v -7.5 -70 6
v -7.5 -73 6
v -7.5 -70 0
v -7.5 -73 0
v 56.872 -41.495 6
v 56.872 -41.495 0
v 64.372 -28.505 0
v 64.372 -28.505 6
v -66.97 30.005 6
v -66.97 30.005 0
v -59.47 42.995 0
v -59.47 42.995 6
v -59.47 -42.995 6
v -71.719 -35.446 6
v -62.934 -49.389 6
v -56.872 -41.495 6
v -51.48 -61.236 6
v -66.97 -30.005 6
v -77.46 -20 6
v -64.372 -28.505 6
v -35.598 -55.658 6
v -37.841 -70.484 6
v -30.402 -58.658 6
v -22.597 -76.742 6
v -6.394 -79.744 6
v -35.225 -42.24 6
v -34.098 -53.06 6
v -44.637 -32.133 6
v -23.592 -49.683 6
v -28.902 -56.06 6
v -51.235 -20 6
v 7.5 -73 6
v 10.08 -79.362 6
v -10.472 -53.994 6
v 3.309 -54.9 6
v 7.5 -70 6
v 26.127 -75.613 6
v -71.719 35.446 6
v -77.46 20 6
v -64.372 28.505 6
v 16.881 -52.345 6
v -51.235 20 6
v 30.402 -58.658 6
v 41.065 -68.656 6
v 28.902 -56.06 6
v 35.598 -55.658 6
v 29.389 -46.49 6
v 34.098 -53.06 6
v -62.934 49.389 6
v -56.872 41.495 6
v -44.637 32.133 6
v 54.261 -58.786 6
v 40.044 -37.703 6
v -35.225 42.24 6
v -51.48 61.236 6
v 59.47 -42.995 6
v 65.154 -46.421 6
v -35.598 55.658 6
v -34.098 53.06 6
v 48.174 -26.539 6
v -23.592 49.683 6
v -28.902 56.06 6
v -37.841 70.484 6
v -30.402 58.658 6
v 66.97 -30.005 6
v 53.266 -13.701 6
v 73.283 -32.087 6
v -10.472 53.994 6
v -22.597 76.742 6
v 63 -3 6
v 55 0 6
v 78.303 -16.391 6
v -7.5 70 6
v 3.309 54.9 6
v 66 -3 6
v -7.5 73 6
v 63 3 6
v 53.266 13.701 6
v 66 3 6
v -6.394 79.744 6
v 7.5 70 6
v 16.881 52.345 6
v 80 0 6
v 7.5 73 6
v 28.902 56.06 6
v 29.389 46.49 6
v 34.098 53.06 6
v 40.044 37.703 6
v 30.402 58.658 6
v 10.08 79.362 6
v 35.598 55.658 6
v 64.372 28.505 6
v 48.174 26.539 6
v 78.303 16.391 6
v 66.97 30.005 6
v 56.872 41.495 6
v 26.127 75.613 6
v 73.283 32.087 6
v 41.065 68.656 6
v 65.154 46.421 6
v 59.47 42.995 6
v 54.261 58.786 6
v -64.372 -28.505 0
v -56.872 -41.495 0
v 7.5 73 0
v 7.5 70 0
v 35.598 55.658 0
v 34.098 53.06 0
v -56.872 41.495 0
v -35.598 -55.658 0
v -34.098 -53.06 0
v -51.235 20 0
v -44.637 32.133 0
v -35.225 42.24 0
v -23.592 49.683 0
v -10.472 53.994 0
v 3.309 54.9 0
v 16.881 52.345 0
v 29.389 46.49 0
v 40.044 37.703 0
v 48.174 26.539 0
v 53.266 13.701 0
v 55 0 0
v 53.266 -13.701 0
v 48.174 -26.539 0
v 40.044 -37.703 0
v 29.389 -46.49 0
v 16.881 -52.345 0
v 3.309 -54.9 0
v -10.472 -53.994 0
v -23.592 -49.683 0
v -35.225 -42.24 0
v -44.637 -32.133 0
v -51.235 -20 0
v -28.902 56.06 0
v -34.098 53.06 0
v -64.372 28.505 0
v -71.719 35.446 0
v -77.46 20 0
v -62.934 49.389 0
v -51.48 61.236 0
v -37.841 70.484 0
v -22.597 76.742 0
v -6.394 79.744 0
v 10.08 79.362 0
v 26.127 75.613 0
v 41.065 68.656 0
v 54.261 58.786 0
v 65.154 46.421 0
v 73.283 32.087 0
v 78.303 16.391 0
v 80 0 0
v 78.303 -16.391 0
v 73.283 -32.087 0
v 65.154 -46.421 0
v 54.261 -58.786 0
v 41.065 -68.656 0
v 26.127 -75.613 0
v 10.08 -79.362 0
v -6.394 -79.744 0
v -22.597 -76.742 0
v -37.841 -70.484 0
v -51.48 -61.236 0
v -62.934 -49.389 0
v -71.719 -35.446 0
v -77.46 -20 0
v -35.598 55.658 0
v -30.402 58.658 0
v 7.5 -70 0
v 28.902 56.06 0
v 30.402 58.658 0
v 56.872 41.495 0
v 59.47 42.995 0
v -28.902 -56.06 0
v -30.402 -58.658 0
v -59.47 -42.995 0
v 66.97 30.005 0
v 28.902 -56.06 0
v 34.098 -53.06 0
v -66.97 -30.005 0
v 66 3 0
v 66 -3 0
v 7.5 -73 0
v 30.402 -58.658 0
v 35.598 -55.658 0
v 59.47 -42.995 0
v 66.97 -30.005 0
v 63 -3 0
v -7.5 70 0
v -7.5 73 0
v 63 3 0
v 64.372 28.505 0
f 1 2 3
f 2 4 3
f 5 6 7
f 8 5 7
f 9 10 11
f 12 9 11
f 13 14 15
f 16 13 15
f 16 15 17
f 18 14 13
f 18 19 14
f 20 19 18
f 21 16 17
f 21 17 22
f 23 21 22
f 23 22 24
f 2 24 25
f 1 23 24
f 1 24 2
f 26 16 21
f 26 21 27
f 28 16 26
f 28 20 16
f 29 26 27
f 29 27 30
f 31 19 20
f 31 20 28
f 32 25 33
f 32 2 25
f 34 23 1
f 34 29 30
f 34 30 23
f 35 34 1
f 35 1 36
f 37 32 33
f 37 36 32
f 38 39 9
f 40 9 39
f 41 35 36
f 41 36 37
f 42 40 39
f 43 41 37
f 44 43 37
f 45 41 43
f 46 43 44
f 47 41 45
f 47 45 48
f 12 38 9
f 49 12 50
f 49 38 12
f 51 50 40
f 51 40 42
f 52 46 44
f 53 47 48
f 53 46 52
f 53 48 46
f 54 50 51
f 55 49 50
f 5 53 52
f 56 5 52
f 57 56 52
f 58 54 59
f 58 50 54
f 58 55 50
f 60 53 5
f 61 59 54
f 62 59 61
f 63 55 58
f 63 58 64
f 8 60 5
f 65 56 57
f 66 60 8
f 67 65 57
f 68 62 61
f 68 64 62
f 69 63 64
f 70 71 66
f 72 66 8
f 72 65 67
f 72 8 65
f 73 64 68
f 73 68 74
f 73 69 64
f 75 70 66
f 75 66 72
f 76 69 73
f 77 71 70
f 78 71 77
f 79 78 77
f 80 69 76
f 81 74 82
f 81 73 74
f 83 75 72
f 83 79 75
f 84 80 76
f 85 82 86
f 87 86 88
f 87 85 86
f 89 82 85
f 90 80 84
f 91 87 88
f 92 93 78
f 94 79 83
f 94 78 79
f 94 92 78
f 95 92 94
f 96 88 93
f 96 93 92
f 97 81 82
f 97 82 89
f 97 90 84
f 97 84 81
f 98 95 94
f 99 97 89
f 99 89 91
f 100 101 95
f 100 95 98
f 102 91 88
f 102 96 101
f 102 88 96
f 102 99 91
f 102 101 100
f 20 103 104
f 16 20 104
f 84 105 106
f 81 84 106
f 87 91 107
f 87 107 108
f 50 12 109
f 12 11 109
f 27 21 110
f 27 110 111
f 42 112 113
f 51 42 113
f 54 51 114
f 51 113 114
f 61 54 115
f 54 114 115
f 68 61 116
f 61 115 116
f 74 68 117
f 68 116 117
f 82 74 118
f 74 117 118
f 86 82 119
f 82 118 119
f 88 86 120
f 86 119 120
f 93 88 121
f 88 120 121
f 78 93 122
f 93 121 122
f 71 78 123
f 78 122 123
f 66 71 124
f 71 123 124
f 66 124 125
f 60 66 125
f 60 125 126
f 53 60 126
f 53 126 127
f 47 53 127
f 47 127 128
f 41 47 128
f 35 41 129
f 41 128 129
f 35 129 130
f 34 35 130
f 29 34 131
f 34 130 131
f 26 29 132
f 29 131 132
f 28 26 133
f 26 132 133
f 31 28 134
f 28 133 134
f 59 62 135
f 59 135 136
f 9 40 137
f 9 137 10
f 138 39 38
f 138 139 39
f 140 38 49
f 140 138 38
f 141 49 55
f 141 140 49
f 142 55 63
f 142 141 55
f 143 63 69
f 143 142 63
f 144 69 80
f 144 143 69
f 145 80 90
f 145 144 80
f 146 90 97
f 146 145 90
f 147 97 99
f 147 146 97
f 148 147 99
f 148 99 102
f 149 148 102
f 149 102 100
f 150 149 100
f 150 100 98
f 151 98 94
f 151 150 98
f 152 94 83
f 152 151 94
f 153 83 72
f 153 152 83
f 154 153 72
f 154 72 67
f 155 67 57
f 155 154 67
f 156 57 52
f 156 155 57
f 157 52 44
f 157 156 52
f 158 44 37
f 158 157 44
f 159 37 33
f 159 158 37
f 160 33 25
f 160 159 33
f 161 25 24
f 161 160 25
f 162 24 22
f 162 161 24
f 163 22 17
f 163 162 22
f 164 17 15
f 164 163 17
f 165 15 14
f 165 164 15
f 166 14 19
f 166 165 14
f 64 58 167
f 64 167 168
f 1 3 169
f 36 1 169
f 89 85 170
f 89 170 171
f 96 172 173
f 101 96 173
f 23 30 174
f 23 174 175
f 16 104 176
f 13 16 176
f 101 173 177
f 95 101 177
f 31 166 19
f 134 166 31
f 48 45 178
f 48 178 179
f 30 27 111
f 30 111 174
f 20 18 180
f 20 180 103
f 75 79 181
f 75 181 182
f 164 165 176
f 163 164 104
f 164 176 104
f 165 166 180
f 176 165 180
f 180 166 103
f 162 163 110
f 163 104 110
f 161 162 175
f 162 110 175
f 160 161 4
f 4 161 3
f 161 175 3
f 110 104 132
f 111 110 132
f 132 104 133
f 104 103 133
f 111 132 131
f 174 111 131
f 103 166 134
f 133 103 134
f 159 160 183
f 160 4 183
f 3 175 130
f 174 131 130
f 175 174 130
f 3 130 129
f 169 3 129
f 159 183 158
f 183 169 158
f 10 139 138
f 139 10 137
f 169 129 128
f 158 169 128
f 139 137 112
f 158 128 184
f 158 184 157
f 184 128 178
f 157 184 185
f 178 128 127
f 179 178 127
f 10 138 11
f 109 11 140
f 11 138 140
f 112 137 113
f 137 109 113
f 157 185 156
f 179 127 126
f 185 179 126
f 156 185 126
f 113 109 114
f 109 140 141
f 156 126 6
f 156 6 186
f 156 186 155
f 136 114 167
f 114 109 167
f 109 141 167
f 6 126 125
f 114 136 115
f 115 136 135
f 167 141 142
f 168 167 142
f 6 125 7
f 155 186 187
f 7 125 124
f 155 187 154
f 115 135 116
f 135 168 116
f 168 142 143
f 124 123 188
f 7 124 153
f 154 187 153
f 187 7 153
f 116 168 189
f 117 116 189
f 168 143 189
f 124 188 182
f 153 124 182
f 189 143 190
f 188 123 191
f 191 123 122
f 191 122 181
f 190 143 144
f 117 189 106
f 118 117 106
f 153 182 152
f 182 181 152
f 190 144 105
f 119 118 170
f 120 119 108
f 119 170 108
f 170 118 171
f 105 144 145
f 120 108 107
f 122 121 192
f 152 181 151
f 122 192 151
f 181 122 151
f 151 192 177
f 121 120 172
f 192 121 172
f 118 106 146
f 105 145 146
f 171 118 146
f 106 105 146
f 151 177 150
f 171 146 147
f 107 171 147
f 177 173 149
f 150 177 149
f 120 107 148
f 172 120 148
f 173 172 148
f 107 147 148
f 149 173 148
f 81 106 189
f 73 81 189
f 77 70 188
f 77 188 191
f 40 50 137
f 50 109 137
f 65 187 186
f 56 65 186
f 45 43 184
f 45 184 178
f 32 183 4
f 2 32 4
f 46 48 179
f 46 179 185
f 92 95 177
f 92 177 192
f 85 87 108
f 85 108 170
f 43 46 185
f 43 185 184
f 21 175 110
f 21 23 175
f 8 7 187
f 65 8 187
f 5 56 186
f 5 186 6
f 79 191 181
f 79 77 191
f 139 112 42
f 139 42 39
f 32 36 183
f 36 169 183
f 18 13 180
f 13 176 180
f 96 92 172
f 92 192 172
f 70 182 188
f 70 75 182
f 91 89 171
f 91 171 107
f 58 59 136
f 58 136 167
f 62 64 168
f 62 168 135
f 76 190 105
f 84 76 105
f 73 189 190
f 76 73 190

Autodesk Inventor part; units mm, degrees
ref_plane "YZ Plane" through (0, 0, 0) normal (1, 0, 0) x (0, 1, 0)
ref_plane "XZ Plane" through (0, 0, 0) normal (0, 1, 0) x (-1, 0, 0)
ref_plane "XY Plane" through (0, 0, 0) normal (0, 0, 1) x (1, 0, 0)
sketch "Sketch1" plane through (0, 0, 0) normal (0, 0, 1) x (1, 0, 0)
  circle A0 centre (0, 0) radius 80
  circle A1 centre (0, 0) radius 55
  line L0 (-7.5, 73) -> (7.5, 73)
  line L1 (7.5, 73) -> (7.5, 70)
  line L2 (7.5, 70) -> (-7.5, 70)
  line L3 (-7.5, 70) -> (-7.5, 73)
  line L4 (-66.9699, 30.0048) -> (-59.4699, 42.9952)
  line L5 (-59.4699, 42.9952) -> (-56.8718, 41.4952)
  line L6 (-56.8718, 41.4952) -> (-64.3718, 28.5048)
  line L7 (-64.3718, 28.5048) -> (-66.9699, 30.0048)
  line L8 (-59.4699, -42.9952) -> (-66.9699, -30.0048)
  line L9 (-66.9699, -30.0048) -> (-64.3718, -28.5048)
  line L10 (-64.3718, -28.5048) -> (-56.8718, -41.4952)
  line L11 (-56.8718, -41.4952) -> (-59.4699, -42.9952)
  line L12 (7.5, -73) -> (-7.5, -73)
  line L13 (-7.5, -73) -> (-7.5, -70)
  line L14 (-7.5, -70) -> (7.5, -70)
  line L15 (7.5, -70) -> (7.5, -73)
  line L16 (66.9699, -30.0048) -> (59.4699, -42.9952)
  line L17 (59.4699, -42.9952) -> (56.8718, -41.4952)
  line L18 (56.8718, -41.4952) -> (64.3718, -28.5048)
  line L19 (64.3718, -28.5048) -> (66.9699, -30.0048)
  line L20 (59.4699, 42.9952) -> (66.9699, 30.0048)
  line L21 (66.9699, 30.0048) -> (64.3718, 28.5048)
  line L22 (64.3718, 28.5048) -> (56.8718, 41.4952)
  line L23 (56.8718, 41.4952) -> (59.4699, 42.9952)
  line L24 (-58.1708, 43.7452) -> (-43.1708, 43.7452)
  line L25 (-43.1708, 43.7452) -> (-43.1708, 40.7452)
  line L26 (-43.1708, 40.7452) -> (-58.1708, 40.7452)
  line L27 (-58.1708, 40.7452) -> (-58.1708, 43.7452)
  line L28 (-58.1708, -40.7452) -> (-43.1708, -40.7452)
  line L29 (-43.1708, -40.7452) -> (-43.1708, -43.7452)
  line L30 (-43.1708, -43.7452) -> (-58.1708, -43.7452)
  line L31 (-58.1708, -43.7452) -> (-58.1708, -40.7452)
  line L32 (0, 20) -> (-100, 20)
  line L33 (-100, 20) -> (-100, -20)
  line L34 (-100, -20) -> (0, -20)
  line L35 (0, -20) -> (0, 20)
  point P0 (0, 73)
  point P1 (7.5, 71.5)
  point P2 (0, 70)
  point P3 (-63.2199, 36.5)
  point P4 (-58.1708, 42.2452)
  point P5 (-60.6218, 35)
  point P6 (-63.2199, -36.5)
  point P7 (-65.6708, -29.2548)
  point P8 (-60.6218, -35)
  point P9 (0, -73)
  point P10 (-7.5, -71.5)
  point P11 (0, -70)
  point P12 (63.2199, -36.5)
  point P13 (58.1708, -42.2452)
  point P14 (60.6218, -35)
  point P15 (63.2199, 36.5)
  point P16 (65.6708, 29.2548)
  point P17 (60.6218, 35)
  point P18 (-58.1708, 42.2452)
  point P19 (-58.1708, -42.2452)
  point P20 (-51.2348, -20)
  point P21 (-77.4597, -20)
  point P22 (-77.4597, 20)
  point P23 (-51.2348, 20)
  dimension "d0" = 160
  dimension "d1" = 110
  dimension "d2" = 15
  dimension "d3" = 3
  dimension "d11" = 70
  dimension "d14" = 360
  dimension "d18" = 15
  dimension "d19" = 3
  dimension "d20" = 15
  dimension "d21" = 3
  dimension "d22" = 40
  dimension "d23" = 100
extrude "Extrusion2" add sketch "Sketch1" along normal blind 6 contours A0 L34 A1 L32 | L27 L24 L25 L26 L6 L5 | L11 L10 L28 L29 L30 L31 picked at (16.7927, -65.9701)
sketch "草圖4" plane through (0, 0, 6) normal (0, 0, 1) x (1, 0, 0)
  line L0 (63, 3) -> (66, 3)
  line L1 (66, 3) -> (66, -3)
  line L2 (66, -3) -> (63, -3)
  line L3 (63, -3) -> (63, 3)
  line L4 (28.9019, 56.0596) -> (30.4019, 58.6577)
  line L5 (30.4019, 58.6577) -> (35.5981, 55.6577)
  line L6 (35.5981, 55.6577) -> (34.0981, 53.0596)
  line L7 (34.0981, 53.0596) -> (28.9019, 56.0596)
  line L8 (-34.0981, 53.0596) -> (-35.5981, 55.6577)
  line L9 (-35.5981, 55.6577) -> (-30.4019, 58.6577)
  line L10 (-30.4019, 58.6577) -> (-28.9019, 56.0596)
  line L11 (-28.9019, 56.0596) -> (-34.0981, 53.0596)
  line L12 (-63, -3) -> (-66, -3)
  line L13 (-66, -3) -> (-66, 3)
  line L14 (-66, 3) -> (-63, 3)
  line L15 (-63, 3) -> (-63, -3)
  line L16 (-28.9019, -56.0596) -> (-30.4019, -58.6577)
  line L17 (-30.4019, -58.6577) -> (-35.5981, -55.6577)
  line L18 (-35.5981, -55.6577) -> (-34.0981, -53.0596)
  line L19 (-34.0981, -53.0596) -> (-28.9019, -56.0596)
  line L20 (34.0981, -53.0596) -> (35.5981, -55.6577)
  line L21 (35.5981, -55.6577) -> (30.4019, -58.6577)
  line L22 (30.4019, -58.6577) -> (28.9019, -56.0596)
  line L23 (28.9019, -56.0596) -> (34.0981, -53.0596)
  point P0 (0, 0)
  point P1 (63, 0)
  point P2 (31.5, 54.5596)
  point P3 (-31.5, 54.5596)
  point P4 (-63, 0)
  point P5 (-31.5, -54.5596)
  point P6 (31.5, -54.5596)
  dimension "d44" = 3
  dimension "d45" = 6
  dimension "d46" = 63
  dimension "d49" = 360
extrude "擠出6" cut sketch "草圖4" against normal blind 10 contours L0 L1 L2 L3 | L4 L5 L6 L7 | L8 L9 L10 L11 | L16 L17 L18 L19 | L20 L21 L22 L23
properties part number "back_cir_hold"
